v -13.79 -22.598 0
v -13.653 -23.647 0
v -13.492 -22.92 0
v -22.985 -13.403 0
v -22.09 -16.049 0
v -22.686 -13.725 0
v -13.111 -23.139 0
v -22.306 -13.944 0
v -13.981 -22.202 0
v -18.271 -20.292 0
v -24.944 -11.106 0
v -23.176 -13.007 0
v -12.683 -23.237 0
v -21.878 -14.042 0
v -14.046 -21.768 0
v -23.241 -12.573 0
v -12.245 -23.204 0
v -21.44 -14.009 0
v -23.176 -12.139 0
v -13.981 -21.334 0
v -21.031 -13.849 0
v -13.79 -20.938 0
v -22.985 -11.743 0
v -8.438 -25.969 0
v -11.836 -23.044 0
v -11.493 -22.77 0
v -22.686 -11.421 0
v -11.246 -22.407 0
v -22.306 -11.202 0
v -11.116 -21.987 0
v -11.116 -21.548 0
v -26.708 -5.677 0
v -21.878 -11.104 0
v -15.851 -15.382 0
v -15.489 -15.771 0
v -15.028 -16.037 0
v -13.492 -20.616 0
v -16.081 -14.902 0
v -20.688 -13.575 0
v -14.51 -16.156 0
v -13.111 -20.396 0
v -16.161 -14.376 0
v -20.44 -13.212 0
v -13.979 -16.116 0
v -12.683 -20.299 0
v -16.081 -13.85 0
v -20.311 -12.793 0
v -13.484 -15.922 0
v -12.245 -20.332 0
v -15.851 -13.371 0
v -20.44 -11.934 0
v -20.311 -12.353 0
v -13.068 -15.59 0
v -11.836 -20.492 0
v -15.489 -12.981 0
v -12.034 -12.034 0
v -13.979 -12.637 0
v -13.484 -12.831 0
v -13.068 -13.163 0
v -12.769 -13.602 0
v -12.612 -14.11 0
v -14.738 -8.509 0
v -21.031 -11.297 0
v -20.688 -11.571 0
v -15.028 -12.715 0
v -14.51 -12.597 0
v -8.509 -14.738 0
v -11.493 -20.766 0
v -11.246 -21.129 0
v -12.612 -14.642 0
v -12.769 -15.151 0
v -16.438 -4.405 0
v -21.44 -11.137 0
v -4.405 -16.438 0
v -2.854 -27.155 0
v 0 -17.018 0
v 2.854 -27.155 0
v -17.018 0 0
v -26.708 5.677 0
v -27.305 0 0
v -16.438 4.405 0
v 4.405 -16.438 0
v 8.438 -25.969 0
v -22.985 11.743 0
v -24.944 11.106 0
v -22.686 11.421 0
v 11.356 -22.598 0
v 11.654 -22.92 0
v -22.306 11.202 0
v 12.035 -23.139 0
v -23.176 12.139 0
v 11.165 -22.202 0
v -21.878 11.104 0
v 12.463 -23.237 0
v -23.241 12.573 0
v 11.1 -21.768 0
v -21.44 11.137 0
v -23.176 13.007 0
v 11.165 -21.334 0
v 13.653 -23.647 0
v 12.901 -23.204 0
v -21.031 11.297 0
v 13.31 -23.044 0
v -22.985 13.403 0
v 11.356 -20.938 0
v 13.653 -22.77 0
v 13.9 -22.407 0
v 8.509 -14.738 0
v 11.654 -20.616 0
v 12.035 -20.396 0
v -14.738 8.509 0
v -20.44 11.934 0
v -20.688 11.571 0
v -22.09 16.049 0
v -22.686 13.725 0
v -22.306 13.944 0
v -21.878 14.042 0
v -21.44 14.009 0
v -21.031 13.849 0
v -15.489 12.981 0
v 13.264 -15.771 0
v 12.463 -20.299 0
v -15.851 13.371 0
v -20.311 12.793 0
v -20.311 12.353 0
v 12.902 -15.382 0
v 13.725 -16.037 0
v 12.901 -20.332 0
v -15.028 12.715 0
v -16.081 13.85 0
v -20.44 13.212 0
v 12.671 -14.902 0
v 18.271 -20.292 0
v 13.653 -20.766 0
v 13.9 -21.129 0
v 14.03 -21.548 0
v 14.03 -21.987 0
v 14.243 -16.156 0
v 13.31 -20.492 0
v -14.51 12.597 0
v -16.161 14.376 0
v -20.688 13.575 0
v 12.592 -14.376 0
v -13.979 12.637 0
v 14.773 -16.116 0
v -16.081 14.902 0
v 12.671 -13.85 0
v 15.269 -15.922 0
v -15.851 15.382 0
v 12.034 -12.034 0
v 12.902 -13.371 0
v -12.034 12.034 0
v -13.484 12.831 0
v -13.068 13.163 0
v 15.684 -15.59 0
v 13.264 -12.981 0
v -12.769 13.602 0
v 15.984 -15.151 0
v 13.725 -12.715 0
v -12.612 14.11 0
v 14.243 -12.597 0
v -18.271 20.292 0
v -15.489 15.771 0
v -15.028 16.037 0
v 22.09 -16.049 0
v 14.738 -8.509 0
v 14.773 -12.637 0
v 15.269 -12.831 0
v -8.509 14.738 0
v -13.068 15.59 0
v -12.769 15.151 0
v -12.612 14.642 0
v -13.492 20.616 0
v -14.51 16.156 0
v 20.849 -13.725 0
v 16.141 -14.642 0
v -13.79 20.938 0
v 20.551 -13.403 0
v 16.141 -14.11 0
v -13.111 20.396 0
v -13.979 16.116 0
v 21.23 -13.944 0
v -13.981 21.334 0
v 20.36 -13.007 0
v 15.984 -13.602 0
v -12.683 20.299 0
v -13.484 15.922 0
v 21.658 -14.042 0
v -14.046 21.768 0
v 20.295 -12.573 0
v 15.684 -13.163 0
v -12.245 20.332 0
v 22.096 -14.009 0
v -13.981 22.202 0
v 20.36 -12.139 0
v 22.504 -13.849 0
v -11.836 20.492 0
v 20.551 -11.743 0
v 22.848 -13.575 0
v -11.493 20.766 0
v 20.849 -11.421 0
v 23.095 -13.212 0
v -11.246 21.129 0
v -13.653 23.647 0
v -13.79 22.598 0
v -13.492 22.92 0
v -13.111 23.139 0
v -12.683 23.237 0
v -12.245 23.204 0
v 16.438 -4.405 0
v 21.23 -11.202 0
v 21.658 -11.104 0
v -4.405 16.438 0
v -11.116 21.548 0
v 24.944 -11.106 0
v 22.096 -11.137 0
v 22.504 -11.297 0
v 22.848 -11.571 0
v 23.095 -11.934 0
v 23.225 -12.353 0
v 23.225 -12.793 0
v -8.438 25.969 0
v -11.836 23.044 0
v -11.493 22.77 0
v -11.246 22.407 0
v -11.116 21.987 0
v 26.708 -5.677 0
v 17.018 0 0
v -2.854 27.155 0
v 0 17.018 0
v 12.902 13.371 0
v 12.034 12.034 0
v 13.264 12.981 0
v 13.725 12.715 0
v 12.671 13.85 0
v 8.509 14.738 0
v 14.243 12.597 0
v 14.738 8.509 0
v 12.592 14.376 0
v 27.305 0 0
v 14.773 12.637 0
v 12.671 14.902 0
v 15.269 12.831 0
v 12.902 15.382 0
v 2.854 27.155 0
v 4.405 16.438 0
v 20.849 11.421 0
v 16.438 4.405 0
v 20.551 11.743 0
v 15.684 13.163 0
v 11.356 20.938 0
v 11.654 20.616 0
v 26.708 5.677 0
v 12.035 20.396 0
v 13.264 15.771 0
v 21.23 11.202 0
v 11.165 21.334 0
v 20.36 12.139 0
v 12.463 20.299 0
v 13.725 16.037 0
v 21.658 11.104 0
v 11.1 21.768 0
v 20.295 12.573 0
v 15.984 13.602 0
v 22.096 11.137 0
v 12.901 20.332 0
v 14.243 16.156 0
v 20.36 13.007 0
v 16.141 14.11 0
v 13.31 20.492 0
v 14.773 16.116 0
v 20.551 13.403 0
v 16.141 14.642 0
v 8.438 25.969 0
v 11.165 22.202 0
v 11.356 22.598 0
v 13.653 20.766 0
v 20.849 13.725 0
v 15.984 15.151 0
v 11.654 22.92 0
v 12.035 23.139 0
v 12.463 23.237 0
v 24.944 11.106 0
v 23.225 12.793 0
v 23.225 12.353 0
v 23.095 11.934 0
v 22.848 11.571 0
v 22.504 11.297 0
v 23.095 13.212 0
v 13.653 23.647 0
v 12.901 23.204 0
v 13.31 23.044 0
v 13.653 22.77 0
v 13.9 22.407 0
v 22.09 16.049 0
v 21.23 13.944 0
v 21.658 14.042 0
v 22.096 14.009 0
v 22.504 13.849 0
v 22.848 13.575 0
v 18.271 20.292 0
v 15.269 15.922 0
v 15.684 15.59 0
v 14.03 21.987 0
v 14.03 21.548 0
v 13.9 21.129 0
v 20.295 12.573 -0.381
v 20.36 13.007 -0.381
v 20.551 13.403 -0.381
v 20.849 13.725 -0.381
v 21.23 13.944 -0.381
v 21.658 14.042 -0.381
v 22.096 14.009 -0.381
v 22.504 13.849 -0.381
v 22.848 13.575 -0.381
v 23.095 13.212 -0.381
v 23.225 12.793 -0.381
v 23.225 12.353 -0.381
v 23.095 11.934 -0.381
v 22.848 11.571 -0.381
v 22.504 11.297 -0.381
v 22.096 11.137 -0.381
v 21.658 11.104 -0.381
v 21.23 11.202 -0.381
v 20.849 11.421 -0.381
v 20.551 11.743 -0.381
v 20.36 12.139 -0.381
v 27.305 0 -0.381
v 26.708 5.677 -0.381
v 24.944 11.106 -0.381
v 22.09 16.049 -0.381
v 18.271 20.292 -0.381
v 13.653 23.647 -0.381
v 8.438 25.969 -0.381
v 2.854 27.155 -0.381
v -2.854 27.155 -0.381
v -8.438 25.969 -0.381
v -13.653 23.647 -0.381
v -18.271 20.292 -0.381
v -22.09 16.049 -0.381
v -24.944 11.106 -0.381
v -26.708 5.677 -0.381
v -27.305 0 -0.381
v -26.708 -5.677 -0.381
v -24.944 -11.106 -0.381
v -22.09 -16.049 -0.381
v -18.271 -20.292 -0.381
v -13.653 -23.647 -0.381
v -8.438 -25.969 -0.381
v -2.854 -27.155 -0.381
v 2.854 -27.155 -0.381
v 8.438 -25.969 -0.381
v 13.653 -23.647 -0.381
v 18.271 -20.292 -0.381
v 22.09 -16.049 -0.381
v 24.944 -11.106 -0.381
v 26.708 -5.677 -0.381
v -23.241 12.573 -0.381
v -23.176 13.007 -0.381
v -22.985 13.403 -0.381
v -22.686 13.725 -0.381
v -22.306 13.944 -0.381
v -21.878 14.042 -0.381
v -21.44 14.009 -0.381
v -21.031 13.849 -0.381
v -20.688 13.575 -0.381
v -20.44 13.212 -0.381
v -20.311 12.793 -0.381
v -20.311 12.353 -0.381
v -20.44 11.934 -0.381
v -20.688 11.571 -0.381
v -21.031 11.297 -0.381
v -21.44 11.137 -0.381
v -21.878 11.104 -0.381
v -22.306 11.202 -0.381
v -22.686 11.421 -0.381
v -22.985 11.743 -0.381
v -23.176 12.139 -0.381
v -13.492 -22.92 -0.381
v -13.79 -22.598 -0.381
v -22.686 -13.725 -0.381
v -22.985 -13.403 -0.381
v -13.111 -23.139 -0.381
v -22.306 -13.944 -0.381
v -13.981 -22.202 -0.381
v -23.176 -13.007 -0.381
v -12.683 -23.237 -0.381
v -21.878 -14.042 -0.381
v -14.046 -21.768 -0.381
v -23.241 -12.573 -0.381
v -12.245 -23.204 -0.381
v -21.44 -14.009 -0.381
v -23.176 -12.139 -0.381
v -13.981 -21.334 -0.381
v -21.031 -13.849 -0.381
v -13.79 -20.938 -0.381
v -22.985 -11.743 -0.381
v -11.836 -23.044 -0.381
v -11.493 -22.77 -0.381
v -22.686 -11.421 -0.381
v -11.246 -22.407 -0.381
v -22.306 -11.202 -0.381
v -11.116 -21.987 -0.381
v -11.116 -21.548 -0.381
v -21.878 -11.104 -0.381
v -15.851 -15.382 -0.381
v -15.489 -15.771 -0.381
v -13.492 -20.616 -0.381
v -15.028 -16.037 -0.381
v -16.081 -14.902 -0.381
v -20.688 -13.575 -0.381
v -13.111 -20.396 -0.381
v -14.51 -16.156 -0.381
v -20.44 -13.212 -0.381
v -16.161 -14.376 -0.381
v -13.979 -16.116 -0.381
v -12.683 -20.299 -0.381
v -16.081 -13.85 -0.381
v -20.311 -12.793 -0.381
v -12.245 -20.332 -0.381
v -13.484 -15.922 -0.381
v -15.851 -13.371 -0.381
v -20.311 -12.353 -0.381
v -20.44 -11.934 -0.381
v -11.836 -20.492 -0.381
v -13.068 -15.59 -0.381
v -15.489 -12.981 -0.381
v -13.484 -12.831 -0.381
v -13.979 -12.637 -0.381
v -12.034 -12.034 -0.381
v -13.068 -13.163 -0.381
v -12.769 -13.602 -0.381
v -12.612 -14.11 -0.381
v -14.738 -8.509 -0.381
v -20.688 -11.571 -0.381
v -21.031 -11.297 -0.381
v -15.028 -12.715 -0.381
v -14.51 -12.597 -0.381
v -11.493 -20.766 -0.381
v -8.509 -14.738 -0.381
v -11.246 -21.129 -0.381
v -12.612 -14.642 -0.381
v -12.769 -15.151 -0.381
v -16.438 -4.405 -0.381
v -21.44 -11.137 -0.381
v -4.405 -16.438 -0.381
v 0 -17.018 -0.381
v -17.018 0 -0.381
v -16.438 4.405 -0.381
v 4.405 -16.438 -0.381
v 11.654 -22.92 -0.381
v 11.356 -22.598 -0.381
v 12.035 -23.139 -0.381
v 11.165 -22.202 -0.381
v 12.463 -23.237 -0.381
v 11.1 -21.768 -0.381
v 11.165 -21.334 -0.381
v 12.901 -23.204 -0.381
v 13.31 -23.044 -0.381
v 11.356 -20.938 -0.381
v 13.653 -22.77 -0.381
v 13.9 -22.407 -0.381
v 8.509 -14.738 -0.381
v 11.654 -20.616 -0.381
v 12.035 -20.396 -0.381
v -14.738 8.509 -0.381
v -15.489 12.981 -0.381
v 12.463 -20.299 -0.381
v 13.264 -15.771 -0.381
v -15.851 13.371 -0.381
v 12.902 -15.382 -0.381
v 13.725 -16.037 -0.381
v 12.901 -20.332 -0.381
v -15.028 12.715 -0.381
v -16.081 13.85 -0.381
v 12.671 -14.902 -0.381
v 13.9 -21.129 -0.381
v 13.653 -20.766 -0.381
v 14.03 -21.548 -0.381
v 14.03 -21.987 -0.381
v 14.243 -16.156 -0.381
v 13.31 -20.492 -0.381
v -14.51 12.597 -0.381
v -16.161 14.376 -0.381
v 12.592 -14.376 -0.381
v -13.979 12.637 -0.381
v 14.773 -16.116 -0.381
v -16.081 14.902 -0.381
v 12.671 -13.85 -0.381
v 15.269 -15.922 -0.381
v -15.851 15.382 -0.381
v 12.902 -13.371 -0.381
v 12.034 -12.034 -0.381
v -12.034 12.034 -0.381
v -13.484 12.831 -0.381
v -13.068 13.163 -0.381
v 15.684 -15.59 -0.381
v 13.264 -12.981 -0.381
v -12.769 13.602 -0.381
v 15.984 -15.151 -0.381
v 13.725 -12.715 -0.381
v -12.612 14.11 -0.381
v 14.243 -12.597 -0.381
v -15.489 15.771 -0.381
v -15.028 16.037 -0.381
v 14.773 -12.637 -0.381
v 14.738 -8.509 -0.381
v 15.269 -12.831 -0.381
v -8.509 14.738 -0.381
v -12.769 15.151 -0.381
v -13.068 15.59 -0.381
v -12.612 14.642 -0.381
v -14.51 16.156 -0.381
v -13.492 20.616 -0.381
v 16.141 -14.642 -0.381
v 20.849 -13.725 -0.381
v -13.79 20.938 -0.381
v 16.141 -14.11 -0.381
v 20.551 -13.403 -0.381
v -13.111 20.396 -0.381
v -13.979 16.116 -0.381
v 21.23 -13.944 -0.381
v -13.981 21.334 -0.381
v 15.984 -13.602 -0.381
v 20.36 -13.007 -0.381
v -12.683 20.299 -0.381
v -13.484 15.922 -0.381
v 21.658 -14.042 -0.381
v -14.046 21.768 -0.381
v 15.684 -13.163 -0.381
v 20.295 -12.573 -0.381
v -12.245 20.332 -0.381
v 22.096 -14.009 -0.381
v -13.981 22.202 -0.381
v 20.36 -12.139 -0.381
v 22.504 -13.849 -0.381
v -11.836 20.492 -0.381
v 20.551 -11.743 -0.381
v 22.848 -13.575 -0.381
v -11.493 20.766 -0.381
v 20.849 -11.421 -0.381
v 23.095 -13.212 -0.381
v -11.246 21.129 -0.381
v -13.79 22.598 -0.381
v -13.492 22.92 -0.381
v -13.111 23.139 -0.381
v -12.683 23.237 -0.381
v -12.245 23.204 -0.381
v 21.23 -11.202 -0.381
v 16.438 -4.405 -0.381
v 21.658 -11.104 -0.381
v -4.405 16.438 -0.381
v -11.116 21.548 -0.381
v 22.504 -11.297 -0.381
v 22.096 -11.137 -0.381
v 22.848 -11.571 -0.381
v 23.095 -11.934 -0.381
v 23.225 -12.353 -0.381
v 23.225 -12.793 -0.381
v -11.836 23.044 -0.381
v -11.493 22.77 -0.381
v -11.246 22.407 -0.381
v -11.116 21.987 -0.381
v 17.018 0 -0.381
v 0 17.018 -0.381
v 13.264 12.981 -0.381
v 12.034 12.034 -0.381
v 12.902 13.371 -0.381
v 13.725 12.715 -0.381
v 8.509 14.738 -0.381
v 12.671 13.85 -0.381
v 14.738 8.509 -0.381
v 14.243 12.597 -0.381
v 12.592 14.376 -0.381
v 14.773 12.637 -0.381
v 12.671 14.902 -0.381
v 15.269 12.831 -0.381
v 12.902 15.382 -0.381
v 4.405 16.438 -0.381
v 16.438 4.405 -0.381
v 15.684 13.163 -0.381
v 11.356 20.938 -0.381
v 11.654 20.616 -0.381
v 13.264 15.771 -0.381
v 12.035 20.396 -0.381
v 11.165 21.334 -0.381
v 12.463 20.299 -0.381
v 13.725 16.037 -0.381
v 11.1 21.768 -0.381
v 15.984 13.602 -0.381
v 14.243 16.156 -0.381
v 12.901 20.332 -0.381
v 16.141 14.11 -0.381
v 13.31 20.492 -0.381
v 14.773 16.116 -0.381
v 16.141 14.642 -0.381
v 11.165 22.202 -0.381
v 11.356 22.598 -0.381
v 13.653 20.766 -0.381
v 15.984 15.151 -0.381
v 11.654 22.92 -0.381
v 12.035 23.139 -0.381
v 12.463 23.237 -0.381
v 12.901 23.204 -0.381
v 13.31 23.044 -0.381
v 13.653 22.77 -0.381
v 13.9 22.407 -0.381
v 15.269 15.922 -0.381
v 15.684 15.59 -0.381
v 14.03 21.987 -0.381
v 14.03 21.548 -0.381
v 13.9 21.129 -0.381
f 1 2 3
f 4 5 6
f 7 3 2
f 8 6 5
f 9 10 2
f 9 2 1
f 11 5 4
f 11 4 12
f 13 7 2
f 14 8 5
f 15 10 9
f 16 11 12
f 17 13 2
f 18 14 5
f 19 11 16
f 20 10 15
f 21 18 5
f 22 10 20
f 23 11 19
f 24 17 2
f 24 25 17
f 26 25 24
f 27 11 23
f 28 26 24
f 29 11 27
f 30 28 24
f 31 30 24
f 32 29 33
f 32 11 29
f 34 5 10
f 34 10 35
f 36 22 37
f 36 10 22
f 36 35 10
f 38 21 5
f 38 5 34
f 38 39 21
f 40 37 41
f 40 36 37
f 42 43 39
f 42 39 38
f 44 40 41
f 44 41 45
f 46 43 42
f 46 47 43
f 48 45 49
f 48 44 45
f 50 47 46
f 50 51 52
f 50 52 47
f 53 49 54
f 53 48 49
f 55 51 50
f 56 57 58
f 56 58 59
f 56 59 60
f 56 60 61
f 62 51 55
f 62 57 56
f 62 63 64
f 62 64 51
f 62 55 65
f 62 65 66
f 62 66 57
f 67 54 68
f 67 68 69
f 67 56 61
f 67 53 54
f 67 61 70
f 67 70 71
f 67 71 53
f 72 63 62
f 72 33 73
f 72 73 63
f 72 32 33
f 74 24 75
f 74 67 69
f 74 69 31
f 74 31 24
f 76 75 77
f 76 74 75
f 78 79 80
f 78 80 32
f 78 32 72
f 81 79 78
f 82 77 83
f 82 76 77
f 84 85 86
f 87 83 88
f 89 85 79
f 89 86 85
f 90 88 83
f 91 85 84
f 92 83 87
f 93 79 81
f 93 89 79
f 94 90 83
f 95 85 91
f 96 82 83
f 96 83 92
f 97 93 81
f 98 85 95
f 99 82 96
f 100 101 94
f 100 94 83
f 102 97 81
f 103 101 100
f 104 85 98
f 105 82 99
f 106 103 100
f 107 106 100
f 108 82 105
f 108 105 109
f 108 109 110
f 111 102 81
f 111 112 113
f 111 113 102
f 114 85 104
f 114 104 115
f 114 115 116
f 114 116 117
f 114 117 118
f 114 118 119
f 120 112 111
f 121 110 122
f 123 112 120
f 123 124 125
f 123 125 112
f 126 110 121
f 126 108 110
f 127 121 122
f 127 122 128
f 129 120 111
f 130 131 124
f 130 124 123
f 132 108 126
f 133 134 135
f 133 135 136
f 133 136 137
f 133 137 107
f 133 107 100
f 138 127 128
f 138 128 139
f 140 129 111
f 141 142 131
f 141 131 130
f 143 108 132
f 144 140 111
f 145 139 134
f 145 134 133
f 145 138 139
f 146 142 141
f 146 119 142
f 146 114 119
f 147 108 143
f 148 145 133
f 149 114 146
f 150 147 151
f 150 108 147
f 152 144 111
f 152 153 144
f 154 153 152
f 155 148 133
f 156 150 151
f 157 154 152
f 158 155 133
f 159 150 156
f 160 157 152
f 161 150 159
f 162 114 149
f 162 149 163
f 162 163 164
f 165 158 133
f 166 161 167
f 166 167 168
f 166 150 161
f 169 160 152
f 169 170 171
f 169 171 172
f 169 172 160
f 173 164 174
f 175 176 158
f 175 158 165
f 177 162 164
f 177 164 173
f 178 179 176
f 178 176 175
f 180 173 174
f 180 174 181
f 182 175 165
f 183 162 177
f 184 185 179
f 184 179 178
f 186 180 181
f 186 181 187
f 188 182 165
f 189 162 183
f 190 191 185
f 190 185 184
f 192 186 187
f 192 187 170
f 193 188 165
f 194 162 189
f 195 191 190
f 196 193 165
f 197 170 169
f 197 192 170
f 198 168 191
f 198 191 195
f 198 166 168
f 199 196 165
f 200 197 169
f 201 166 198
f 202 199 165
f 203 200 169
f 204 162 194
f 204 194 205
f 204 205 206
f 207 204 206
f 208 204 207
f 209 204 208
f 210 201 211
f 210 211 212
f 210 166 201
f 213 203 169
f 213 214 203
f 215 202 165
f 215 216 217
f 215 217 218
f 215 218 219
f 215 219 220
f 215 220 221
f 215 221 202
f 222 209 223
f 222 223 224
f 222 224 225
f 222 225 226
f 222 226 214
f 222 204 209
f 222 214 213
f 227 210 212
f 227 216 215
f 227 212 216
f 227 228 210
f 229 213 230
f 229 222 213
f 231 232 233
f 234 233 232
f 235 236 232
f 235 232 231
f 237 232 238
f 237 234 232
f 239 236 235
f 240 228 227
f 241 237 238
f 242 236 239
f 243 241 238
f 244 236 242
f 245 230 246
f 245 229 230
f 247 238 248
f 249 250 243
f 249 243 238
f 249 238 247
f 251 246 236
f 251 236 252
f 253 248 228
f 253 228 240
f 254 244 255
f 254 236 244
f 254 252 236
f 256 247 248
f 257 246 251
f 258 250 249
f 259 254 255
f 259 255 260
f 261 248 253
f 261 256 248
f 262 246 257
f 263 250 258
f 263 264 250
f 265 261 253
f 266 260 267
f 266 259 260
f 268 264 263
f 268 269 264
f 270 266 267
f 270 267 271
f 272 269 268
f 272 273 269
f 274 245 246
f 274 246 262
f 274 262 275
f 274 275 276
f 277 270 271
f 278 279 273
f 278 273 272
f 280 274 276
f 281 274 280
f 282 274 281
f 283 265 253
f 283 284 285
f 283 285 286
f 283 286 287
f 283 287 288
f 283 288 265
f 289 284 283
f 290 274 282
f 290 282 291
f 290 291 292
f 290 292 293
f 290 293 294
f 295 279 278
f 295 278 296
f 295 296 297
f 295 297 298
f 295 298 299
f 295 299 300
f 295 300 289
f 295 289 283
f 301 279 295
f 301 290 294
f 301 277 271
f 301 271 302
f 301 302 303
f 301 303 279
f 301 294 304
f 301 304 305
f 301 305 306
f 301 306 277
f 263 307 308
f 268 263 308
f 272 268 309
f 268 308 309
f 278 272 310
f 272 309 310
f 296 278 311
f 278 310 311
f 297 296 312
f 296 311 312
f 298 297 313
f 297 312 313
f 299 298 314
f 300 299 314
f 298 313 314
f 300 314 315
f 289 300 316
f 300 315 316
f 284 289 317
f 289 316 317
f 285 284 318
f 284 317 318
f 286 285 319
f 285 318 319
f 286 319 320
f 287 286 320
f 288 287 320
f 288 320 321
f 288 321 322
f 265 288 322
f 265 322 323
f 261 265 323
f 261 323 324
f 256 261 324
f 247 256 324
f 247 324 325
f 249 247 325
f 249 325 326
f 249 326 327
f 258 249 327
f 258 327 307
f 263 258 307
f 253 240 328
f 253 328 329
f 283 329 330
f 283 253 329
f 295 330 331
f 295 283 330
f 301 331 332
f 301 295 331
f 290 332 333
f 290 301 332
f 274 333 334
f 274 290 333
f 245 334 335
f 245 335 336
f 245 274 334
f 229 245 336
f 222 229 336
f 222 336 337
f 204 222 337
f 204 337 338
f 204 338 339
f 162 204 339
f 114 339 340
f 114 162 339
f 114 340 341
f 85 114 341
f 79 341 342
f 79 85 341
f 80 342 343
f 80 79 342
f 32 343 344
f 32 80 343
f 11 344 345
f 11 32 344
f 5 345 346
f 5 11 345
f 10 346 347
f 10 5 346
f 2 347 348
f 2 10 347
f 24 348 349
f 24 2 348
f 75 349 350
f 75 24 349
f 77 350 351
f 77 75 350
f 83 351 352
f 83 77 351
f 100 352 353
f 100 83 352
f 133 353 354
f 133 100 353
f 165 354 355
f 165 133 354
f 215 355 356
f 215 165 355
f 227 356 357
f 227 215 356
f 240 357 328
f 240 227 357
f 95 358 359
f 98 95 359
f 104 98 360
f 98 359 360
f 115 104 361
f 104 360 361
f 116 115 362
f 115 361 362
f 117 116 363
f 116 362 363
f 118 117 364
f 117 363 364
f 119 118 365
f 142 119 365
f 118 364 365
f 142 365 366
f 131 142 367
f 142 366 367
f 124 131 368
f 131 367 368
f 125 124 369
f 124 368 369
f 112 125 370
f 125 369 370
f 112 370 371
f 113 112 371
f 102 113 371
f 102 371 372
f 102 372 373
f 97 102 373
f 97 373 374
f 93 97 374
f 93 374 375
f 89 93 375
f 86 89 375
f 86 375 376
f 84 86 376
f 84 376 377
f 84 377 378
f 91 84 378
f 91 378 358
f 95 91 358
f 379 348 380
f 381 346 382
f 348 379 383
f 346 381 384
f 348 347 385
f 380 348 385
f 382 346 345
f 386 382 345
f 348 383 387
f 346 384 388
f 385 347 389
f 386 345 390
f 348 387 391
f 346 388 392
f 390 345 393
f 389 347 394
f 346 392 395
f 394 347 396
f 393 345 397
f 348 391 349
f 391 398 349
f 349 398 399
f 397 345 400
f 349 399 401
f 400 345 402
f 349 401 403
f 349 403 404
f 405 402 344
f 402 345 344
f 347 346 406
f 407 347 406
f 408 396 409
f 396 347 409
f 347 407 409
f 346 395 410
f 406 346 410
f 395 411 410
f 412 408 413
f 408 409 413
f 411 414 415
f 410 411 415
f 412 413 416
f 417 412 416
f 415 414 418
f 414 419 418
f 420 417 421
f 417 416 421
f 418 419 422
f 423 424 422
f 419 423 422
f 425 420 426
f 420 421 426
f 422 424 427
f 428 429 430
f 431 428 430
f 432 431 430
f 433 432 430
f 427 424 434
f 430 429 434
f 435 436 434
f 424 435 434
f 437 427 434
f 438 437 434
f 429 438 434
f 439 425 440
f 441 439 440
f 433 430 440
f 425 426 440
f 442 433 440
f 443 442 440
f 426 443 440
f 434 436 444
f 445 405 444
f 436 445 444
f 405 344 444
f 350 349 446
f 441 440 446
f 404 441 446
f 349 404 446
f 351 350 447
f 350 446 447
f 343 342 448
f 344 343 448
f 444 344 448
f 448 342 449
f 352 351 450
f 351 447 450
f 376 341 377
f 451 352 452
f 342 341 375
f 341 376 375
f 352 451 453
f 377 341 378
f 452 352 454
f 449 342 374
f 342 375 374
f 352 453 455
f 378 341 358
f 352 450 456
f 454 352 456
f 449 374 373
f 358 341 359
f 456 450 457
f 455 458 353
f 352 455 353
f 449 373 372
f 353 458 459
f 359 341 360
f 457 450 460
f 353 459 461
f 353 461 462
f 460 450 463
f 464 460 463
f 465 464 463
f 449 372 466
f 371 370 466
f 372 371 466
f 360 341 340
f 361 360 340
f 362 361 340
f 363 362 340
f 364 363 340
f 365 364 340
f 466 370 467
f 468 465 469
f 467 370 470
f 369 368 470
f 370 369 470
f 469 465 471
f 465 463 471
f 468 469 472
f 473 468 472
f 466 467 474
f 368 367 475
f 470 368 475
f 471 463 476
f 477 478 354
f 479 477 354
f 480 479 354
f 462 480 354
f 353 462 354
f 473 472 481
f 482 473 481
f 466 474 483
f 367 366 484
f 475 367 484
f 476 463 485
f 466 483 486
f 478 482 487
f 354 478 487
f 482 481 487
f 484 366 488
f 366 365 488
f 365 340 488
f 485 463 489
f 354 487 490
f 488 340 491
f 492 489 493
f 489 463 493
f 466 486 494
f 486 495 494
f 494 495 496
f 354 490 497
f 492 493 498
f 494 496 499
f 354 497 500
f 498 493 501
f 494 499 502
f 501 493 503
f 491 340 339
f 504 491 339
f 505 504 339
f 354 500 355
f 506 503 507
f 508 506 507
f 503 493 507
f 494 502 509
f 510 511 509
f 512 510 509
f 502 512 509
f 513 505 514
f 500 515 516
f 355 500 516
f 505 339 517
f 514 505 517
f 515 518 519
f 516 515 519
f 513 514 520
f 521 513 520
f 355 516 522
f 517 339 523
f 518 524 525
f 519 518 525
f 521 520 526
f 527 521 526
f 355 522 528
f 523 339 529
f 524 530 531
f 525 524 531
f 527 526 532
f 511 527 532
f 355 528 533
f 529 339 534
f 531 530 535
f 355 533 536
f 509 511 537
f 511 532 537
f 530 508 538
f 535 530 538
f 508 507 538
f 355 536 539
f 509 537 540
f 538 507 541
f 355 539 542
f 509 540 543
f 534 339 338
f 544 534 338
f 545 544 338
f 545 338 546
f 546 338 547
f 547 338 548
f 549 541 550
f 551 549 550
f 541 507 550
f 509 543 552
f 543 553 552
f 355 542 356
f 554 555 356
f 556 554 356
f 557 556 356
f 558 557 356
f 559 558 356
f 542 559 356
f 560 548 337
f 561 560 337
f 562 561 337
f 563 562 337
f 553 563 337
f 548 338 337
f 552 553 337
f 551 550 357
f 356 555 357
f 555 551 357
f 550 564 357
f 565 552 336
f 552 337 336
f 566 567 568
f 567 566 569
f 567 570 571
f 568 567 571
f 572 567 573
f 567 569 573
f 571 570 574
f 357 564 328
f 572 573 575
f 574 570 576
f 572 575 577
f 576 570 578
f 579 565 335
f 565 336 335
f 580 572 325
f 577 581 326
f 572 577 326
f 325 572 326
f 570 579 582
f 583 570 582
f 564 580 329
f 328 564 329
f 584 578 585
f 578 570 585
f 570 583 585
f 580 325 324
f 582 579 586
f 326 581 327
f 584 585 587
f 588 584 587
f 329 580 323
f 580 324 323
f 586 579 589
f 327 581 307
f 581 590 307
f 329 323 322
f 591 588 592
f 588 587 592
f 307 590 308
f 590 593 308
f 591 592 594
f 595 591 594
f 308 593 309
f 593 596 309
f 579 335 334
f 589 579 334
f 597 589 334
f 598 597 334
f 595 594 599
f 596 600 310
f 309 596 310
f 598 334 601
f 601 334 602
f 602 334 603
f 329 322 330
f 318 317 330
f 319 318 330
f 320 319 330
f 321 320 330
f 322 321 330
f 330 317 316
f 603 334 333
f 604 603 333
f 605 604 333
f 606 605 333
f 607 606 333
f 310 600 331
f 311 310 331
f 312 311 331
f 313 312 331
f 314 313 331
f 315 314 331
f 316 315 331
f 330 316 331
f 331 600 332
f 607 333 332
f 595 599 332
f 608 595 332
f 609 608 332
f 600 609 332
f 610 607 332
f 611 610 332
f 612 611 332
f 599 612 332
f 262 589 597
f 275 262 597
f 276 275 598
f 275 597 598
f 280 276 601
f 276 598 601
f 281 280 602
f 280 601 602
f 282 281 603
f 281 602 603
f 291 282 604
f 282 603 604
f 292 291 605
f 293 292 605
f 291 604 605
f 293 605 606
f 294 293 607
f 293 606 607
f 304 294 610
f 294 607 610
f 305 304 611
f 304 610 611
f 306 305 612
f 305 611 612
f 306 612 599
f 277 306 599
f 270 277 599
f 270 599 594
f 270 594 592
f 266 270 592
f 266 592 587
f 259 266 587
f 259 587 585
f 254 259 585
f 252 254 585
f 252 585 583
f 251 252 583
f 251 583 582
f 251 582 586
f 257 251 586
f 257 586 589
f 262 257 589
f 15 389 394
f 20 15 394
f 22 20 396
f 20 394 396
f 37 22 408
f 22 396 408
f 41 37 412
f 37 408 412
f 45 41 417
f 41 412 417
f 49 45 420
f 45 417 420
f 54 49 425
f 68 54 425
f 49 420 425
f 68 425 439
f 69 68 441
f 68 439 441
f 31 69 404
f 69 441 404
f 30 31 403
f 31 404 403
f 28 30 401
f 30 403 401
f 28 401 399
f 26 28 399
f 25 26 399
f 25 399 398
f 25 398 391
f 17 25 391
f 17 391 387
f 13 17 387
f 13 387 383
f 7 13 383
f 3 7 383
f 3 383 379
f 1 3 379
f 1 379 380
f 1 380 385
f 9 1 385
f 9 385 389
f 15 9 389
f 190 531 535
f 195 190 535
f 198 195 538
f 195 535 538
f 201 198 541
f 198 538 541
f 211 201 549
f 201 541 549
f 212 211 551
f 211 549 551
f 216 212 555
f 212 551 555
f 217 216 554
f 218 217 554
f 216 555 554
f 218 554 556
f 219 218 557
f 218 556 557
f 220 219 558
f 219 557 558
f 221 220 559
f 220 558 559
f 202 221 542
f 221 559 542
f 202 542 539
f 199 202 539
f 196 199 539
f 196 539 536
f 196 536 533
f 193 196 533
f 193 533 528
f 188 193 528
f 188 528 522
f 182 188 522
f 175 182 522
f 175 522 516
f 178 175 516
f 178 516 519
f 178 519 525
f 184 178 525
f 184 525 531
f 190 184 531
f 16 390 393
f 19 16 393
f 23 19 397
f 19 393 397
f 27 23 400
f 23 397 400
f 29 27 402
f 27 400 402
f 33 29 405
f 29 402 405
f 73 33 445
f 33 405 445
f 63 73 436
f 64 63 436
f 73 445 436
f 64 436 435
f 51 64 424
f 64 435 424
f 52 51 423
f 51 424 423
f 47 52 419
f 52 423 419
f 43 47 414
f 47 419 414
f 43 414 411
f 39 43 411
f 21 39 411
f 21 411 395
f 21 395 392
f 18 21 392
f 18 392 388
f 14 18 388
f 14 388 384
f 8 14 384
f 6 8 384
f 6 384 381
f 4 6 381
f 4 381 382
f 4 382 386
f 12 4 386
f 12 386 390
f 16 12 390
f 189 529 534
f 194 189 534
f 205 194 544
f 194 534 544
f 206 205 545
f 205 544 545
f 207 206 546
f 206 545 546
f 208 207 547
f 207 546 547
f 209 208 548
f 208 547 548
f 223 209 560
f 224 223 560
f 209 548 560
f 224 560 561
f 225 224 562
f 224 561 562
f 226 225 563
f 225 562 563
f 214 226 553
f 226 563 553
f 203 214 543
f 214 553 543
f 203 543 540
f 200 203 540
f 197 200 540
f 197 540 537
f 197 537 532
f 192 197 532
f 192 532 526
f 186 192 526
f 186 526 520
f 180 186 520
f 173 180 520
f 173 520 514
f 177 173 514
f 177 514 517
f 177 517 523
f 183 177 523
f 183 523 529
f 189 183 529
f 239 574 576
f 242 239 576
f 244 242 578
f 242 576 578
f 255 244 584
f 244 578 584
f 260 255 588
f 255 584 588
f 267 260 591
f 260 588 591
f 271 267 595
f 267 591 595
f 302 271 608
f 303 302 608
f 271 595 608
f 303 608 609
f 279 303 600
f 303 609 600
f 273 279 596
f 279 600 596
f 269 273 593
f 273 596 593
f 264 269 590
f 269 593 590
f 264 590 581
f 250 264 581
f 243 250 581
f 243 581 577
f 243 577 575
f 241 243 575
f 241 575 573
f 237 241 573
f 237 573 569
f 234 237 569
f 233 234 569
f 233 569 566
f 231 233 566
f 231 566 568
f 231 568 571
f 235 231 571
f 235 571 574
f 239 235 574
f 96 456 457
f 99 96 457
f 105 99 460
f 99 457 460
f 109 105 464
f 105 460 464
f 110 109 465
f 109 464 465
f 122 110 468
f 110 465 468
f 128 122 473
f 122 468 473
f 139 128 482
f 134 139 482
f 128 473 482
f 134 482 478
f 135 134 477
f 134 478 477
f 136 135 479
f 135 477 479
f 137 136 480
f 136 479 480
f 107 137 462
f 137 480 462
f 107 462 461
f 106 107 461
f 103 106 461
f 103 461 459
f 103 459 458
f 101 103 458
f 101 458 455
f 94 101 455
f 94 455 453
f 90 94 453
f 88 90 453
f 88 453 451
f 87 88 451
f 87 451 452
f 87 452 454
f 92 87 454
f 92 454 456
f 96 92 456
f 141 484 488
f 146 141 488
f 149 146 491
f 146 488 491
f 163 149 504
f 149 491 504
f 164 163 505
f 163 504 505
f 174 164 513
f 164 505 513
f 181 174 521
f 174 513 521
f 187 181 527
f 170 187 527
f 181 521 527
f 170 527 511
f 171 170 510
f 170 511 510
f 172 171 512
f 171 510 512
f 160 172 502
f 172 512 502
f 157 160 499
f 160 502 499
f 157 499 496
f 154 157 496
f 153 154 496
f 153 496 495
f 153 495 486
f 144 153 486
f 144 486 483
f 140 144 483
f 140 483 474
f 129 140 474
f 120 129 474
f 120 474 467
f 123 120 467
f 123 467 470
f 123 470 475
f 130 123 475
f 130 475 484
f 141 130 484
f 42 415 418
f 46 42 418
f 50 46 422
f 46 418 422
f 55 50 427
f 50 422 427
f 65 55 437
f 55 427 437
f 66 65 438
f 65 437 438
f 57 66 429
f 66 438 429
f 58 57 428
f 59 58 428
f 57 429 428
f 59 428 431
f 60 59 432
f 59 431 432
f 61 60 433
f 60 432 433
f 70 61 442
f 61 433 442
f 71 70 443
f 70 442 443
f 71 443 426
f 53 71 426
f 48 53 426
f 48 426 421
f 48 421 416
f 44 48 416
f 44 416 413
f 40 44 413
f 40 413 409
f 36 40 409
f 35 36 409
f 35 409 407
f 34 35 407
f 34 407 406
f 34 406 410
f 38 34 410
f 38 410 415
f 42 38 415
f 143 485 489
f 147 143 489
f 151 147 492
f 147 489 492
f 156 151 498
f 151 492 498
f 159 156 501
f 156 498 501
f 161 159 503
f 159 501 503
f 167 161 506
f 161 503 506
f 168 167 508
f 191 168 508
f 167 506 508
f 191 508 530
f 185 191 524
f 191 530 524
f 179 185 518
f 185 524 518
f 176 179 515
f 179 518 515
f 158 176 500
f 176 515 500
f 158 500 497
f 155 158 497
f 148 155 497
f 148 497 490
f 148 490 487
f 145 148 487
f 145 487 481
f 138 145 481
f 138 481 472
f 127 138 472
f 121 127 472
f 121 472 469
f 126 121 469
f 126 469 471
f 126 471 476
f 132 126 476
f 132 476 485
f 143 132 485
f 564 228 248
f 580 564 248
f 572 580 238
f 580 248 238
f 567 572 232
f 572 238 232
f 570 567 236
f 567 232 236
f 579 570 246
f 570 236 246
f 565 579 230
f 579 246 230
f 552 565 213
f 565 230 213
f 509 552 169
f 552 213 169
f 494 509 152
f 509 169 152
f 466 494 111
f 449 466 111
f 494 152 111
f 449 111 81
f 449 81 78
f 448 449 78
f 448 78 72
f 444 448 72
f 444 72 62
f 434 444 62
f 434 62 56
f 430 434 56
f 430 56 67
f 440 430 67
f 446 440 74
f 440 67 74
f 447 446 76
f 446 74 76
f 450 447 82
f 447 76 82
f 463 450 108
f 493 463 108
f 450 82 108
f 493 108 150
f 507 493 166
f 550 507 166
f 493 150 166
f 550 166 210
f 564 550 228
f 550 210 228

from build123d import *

# Parameters (mm, degrees)
F0_R     = 27.305
F0_R_2   = 17.018
F1_DEPTH = 0.381
F2_D     = 2.9464
F3_D     = 3.5687


with BuildPart() as f1:
    # F0 (on Top) → F1 (new body)
    with BuildSketch(Plane.XY):
        Circle(F0_R)
        Circle(F0_R_2, mode=Mode.SUBTRACT)
    extrude(amount=-F1_DEPTH)

    # F2 (through all)
    with Locations(Plane.XY):
        with Locations((12.573, 21.7678), (21.7678, 12.573), (21.7678, -12.573), (12.573, -21.7678), (-12.573, -21.7678), (-21.7678, -12.573), (-21.7678, 12.573), (-12.573, 21.7678)):
            Hole(F2_D / 2)

    # F3 (through all)
    with Locations(Plane.XY):
        with Locations((14.3764, 14.3764), (14.3764, -14.3764), (-14.3764, -14.3764), (-14.3764, 14.3764)):
            Hole(F3_D / 2)


solid = f1.part
